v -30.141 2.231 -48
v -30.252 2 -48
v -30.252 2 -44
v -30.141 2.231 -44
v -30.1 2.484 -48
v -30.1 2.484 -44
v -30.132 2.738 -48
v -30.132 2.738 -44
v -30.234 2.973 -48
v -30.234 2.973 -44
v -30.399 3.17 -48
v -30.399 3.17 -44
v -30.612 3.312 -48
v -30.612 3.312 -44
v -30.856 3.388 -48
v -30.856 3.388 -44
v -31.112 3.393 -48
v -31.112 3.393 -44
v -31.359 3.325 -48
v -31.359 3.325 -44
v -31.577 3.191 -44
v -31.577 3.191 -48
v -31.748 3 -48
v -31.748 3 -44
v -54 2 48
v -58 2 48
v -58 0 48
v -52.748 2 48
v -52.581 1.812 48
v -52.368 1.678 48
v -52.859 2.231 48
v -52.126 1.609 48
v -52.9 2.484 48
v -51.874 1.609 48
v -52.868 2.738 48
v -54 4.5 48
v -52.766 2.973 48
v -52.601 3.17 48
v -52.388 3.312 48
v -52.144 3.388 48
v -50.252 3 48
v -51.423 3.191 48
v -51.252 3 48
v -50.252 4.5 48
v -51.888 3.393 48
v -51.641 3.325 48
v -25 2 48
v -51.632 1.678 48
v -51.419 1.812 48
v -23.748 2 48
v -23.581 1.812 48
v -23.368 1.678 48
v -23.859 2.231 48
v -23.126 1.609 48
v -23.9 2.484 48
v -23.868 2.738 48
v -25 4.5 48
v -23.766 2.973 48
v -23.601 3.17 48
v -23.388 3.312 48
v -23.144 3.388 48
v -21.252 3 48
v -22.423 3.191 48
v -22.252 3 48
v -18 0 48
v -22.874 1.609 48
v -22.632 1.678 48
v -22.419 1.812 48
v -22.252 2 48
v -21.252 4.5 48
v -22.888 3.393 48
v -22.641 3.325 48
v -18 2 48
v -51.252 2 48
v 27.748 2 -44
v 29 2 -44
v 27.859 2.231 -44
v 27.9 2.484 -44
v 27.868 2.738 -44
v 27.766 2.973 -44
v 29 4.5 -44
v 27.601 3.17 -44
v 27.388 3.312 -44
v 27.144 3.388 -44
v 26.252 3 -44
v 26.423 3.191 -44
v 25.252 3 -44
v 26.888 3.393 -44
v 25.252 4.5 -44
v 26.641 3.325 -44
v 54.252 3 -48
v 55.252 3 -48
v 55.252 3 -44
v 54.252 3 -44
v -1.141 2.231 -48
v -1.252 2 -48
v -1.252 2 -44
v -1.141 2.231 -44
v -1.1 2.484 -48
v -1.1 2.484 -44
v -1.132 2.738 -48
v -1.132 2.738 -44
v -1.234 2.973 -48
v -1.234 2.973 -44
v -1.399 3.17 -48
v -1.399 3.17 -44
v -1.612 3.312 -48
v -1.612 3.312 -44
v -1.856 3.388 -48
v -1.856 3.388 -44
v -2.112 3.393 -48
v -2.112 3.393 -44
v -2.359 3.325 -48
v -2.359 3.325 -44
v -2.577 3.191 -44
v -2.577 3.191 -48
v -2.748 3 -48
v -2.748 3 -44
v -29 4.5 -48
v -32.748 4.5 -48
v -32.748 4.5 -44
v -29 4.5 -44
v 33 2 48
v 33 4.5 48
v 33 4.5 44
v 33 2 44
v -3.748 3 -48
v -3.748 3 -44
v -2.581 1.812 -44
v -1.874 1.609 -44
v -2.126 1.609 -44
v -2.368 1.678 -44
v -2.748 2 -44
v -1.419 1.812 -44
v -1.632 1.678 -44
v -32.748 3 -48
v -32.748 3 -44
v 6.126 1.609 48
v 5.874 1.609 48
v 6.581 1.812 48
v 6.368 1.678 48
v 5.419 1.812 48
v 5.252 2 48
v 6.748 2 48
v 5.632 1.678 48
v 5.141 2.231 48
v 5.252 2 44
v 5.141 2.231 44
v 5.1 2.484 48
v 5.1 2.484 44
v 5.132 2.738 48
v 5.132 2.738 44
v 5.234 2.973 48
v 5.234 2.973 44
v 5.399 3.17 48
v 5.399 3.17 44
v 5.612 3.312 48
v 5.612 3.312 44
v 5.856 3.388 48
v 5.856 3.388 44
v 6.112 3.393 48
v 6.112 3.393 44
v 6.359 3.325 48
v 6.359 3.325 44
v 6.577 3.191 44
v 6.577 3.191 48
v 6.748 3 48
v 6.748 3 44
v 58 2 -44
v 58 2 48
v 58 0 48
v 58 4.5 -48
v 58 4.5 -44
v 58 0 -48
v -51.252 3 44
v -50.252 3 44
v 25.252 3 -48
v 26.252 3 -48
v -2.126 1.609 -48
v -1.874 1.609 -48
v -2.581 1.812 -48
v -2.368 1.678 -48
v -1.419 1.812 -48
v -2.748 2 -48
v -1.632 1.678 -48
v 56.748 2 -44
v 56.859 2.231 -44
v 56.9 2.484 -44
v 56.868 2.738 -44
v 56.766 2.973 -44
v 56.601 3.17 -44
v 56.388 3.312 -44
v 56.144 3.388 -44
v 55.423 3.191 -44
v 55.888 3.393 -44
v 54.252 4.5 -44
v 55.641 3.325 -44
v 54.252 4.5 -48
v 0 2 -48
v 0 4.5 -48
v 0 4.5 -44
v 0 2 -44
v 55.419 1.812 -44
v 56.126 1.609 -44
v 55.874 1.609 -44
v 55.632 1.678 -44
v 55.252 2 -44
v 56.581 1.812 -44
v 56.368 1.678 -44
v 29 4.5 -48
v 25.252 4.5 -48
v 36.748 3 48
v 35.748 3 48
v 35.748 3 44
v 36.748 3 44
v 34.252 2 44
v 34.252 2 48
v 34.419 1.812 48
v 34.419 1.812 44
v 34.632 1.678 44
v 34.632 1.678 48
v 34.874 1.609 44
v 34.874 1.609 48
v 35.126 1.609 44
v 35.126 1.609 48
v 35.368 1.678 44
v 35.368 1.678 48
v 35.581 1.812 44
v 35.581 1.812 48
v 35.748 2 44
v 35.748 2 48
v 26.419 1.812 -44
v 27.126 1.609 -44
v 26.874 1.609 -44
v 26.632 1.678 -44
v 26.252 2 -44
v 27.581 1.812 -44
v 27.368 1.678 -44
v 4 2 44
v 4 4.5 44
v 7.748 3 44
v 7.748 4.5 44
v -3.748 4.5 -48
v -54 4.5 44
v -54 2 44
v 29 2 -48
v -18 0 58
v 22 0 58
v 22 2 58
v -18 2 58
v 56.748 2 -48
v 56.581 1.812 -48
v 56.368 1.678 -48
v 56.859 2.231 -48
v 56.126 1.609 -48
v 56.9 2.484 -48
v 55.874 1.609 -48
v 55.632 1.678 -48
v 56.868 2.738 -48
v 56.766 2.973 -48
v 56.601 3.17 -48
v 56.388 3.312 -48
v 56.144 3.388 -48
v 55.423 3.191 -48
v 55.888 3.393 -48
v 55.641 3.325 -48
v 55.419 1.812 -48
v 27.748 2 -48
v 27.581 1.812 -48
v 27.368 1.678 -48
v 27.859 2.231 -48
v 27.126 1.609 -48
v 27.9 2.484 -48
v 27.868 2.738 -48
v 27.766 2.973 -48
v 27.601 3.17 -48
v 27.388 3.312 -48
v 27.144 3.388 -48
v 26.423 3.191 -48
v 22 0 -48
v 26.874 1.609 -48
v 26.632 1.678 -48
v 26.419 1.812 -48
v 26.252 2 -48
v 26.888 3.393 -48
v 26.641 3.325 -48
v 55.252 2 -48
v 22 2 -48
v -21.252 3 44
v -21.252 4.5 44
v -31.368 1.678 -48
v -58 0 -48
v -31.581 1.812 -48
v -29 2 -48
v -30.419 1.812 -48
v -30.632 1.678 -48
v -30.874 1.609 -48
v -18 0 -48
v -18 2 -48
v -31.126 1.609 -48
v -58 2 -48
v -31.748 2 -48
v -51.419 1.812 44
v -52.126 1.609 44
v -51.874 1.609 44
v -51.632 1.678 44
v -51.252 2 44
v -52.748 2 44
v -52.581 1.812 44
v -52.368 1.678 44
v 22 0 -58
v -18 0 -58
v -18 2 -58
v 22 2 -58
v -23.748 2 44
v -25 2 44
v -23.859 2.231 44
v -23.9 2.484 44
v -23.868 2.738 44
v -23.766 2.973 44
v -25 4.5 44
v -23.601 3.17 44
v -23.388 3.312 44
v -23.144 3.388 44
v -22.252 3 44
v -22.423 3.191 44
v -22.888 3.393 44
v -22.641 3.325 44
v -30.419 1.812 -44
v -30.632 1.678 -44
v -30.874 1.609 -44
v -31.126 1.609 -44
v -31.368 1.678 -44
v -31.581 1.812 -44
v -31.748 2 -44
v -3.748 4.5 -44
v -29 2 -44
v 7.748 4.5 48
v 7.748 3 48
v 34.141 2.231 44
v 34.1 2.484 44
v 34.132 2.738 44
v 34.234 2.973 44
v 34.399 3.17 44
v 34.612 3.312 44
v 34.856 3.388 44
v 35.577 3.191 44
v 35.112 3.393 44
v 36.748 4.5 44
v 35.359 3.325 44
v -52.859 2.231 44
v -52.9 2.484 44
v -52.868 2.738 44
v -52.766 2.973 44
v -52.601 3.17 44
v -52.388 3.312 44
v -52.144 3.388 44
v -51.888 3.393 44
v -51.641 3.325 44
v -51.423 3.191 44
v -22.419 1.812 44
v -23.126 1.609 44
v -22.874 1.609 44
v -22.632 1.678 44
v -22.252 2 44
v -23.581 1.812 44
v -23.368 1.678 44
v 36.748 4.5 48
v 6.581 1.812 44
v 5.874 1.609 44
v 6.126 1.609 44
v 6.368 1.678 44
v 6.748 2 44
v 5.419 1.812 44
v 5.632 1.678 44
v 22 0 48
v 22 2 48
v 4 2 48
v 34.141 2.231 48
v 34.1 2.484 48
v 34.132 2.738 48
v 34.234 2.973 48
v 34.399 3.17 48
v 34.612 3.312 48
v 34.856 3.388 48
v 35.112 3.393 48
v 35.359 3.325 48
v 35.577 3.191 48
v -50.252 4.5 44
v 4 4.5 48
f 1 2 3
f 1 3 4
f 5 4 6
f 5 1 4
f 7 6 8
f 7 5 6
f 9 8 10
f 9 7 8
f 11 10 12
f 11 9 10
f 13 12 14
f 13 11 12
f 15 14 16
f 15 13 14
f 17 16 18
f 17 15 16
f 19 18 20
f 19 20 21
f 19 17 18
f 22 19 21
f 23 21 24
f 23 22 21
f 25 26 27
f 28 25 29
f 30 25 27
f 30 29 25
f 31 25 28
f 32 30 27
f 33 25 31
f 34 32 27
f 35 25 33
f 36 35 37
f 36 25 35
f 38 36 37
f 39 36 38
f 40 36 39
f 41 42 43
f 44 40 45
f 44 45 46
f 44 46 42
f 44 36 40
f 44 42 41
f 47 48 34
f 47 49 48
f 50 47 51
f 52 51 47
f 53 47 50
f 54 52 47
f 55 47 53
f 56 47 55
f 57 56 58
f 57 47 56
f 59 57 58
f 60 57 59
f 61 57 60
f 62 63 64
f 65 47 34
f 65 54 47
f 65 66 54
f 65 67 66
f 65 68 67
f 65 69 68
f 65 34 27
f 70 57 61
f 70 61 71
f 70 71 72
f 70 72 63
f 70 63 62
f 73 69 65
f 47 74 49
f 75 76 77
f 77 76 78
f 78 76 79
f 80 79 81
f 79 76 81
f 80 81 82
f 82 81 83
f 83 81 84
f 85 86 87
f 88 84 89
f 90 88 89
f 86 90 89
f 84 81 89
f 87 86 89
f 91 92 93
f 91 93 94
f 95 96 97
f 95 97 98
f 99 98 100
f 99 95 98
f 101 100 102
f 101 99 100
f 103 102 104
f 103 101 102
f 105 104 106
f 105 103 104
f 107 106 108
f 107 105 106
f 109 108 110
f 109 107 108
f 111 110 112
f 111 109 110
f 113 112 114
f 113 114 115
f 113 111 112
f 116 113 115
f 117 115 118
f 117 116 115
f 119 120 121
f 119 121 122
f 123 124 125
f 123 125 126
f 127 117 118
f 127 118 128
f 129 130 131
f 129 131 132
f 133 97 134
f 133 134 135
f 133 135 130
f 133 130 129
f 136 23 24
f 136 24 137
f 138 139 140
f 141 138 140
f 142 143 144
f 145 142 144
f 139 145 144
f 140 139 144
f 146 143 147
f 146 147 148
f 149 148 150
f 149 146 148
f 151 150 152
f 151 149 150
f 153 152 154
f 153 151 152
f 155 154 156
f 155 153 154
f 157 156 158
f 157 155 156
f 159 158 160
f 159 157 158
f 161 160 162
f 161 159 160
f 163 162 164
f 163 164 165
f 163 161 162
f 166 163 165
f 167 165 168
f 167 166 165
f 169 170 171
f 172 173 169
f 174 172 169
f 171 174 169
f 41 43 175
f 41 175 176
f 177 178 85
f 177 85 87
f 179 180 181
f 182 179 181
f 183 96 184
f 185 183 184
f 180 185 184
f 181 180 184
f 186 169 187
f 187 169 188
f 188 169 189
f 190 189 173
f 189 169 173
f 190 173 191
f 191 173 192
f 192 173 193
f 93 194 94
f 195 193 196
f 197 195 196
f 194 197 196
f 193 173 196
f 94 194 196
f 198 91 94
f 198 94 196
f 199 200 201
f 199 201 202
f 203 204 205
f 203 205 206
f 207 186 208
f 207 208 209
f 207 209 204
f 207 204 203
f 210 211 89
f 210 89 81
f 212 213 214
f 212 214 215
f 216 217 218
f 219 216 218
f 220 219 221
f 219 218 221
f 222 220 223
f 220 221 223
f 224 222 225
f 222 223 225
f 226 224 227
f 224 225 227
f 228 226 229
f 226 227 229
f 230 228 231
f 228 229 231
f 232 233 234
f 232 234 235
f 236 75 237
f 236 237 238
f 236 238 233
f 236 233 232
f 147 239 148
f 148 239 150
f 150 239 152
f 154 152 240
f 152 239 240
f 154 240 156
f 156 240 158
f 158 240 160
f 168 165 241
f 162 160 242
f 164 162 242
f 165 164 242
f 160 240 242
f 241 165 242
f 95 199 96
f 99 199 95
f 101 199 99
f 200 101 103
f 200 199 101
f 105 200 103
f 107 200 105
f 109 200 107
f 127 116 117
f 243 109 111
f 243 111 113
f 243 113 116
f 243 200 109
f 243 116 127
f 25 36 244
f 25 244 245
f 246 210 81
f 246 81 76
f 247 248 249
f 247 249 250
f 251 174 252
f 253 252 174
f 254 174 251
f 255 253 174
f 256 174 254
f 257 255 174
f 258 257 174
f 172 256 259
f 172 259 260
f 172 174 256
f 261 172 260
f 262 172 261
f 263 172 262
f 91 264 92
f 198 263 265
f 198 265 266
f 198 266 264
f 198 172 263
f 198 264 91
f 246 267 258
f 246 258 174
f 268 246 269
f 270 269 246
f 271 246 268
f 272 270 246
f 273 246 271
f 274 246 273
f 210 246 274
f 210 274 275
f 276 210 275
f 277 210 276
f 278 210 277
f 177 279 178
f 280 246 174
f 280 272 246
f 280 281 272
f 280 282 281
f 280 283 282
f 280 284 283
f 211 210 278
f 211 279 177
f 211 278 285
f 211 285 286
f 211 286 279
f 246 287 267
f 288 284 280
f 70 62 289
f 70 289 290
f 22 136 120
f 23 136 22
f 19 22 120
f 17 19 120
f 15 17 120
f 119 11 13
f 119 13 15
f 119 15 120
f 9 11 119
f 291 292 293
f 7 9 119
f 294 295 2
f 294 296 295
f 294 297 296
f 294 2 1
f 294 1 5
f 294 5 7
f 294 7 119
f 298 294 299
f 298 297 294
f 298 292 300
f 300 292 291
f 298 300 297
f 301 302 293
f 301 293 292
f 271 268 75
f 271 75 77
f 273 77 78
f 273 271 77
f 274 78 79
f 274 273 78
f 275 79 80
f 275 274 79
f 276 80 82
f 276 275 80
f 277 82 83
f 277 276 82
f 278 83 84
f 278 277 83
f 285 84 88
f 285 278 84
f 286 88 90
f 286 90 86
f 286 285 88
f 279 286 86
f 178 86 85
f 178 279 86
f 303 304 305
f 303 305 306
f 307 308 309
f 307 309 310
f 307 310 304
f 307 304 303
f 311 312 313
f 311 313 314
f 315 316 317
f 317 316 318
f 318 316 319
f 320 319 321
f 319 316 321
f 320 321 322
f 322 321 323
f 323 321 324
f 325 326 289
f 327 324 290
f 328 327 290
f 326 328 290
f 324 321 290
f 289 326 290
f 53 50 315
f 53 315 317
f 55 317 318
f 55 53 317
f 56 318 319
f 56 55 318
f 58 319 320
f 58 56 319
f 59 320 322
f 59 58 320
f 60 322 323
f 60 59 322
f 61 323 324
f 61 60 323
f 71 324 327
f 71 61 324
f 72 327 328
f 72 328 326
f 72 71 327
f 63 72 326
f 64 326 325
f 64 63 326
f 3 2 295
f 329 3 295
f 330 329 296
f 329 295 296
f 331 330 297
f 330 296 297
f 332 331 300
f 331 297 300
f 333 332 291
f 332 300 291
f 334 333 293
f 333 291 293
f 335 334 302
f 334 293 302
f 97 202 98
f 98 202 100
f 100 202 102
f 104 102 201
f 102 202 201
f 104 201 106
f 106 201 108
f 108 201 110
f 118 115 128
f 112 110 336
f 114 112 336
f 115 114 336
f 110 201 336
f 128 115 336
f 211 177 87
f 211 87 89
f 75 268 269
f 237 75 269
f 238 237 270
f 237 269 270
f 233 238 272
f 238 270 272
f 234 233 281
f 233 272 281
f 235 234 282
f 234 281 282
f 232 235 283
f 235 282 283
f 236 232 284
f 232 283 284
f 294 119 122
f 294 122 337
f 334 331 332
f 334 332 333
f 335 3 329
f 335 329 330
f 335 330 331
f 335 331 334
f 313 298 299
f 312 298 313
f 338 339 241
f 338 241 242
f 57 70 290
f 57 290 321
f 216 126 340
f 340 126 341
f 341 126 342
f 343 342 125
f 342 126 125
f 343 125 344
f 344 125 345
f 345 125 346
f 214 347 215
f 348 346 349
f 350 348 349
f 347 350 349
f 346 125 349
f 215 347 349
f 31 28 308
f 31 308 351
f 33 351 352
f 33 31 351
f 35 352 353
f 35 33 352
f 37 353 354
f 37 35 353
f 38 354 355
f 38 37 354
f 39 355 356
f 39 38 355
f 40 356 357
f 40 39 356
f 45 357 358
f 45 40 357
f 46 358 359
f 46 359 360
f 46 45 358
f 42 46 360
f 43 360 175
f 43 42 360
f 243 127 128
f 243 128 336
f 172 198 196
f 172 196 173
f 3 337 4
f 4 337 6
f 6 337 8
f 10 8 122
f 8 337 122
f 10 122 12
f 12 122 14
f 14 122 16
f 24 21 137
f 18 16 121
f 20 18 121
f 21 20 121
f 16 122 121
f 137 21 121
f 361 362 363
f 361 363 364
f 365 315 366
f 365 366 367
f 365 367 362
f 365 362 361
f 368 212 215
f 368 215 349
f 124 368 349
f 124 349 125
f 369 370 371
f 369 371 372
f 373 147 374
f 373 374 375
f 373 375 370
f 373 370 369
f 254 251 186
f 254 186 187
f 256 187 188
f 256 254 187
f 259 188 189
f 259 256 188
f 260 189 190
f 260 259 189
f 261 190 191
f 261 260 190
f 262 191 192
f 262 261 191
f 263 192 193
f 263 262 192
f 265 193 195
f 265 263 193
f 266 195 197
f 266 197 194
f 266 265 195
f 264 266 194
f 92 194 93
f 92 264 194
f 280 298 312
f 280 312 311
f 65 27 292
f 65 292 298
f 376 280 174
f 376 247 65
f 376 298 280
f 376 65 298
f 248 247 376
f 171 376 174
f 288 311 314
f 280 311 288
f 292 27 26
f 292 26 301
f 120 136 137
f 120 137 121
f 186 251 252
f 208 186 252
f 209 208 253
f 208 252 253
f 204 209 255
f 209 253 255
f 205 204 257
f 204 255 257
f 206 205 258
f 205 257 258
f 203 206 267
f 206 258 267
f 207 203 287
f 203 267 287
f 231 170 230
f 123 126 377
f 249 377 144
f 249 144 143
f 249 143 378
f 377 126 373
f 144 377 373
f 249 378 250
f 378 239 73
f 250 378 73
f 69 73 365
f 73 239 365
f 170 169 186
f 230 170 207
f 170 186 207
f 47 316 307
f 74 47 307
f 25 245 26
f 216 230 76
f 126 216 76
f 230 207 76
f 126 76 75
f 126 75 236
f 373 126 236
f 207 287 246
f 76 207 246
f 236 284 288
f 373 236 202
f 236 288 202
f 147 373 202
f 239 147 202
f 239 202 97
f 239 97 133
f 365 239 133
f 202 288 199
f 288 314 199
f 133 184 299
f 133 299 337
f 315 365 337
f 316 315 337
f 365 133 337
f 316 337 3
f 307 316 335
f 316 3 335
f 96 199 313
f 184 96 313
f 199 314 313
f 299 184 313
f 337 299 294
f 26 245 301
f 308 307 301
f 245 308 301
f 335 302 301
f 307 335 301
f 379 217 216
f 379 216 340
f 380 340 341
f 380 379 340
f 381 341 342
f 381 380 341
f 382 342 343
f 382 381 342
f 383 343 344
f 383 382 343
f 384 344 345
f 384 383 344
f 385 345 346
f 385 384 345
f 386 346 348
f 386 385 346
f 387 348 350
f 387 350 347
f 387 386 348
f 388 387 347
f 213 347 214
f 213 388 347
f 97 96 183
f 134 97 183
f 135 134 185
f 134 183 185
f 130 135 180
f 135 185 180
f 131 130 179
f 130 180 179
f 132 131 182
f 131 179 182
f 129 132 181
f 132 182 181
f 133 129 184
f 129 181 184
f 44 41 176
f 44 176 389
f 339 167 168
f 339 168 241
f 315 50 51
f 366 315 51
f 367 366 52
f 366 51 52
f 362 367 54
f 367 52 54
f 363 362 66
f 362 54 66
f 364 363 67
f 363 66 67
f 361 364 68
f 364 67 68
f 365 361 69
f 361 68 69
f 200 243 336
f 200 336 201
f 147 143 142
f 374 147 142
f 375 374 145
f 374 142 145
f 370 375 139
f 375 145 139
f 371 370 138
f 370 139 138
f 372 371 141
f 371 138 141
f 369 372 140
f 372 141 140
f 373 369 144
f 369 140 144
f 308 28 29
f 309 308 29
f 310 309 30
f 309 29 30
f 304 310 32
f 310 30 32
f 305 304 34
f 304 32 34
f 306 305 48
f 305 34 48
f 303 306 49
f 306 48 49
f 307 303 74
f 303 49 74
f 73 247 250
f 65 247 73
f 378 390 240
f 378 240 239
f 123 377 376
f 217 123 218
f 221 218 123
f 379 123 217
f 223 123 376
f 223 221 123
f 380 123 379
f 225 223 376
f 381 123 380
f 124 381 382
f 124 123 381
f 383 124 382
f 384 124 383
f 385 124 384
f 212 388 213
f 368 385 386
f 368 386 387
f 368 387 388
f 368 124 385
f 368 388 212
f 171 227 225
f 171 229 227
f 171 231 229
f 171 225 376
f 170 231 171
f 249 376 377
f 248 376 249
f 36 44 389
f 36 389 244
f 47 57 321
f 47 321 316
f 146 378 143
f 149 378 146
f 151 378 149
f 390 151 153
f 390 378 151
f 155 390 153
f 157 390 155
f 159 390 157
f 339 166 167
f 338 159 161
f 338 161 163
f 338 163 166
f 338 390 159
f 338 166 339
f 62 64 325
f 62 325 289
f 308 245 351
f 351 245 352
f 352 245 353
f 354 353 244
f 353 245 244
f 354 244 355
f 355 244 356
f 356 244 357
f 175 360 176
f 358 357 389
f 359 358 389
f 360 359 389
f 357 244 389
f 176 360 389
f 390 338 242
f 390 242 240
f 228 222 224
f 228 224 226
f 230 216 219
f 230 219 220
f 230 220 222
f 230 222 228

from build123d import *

# Parameters (mm, degrees)
BOSS_EXTRUDE1_DEPTH    = 2
BOSS_EXTRUDE2_DEPTH    = 4
CUT_EXTRUDE1_DEPTH     = 4
CIRPATTERN1_COUNT      = 2
LPATTERN4_COUNT        = 4
LPATTERN4_PITCH        = 29
LPATTERN4_COPY_1_DEPTH = 4
LPATTERN4_COPY_2_DEPTH = 4
LPATTERN4_COPY_3_DEPTH = 4
LPATTERN4_COPY_4_DEPTH = 4
LPATTERN4_COPY_5_DEPTH = 4
LPATTERN4_COPY_6_DEPTH = 4


with BuildPart() as part:
    # Sketch1 → Boss-Extrude1 (new body)
    with BuildSketch(Plane(origin=(0, 0, 0), x_dir=(1, 0, 0), z_dir=(0, 1, 0))):
        Polygon((-18, -58), (-18, -48), (-58, -48), (-58, 48), (-18, 48), (-18, 58), (22, 58), (22, 48), (58, 48), (58, -48), (22, -48), (22, -58), align=None)
    extrude(amount=BOSS_EXTRUDE1_DEPTH)

    # Sketch2 → Boss-Extrude2 (add)
    with BuildSketch(Plane(origin=(0, 0, -48), x_dir=(-1, 0, 0), z_dir=(0, 0, -1))):
        with BuildLine():
            ThreePointArc((-55.251668523, 2), (-56.9, 2.5), (-55.251668523, 3))
            Line((-55.251668523, 3), (-54.251668523, 3))
            Line((-54.251668523, 3), (-54.251668523, 4.5))
            Line((-54.251668523, 4.5), (-58, 4.5))
            Line((-58, 4.5), (-58, 0))
            Line((-58, 0), (-54.251668523, 0))
            Line((-54.251668523, 0), (-54.251668523, 2))
            Line((-54.251668523, 2), (-55.251668523, 2))
        make_face()
    boss_extrude2 = extrude(amount=-BOSS_EXTRUDE2_DEPTH)

    # Sketch2<3> → Cut-Extrude1 (cut)
    with BuildSketch(Plane(origin=(0, 0, -48), x_dir=(-1, 0, 0), z_dir=(0, 0, -1))):
        with BuildLine():
            Line((-55.251668523, 2), (-56.748331477, 2))
            ThreePointArc((-56.748331477, 2), (-56, 1.6), (-55.251668523, 2))
        make_face()
    cut_extrude1 = extrude(amount=-CUT_EXTRUDE1_DEPTH, mode=Mode.SUBTRACT)

    # CirPattern1: Boss-Extrude2, Cut-Extrude1 ×2 about axis
    cirpattern1_axis = Axis((45.5, 2, 0), (0, 1, 0))
    add([boss_extrude2.rotate(cirpattern1_axis, i * 360 / CIRPATTERN1_COUNT) for i in range(1, CIRPATTERN1_COUNT)])
    add([cut_extrude1.rotate(cirpattern1_axis, i * 360 / CIRPATTERN1_COUNT) for i in range(1, CIRPATTERN1_COUNT)], mode=Mode.SUBTRACT)

    # LPattern4: Boss-Extrude2, Cut-Extrude1 ×4
    with Locations(*[(-i * LPATTERN4_PITCH, 0, 0) for i in range(1, LPATTERN4_COUNT)]):
        add(boss_extrude2)
        add(cut_extrude1, mode=Mode.SUBTRACT)

    # LPattern4 copy 1 sketch → LPattern4 copy 1 (add)
    with BuildSketch(Plane(origin=(62, 0, 48), x_dir=(1, 0, 0), z_dir=(0, 0, 1))):
        with BuildLine():
            ThreePointArc((-55.251668523, 2), (-56.9, 2.5), (-55.251668523, 3))
            Line((-55.251668523, 3), (-54.251668523, 3))
            Line((-54.251668523, 3), (-54.251668523, 4.5))
            Line((-54.251668523, 4.5), (-58, 4.5))
            Line((-58, 4.5), (-58, 0))
            Line((-58, 0), (-54.251668523, 0))
            Line((-54.251668523, 0), (-54.251668523, 2))
            Line((-54.251668523, 2), (-55.251668523, 2))
        make_face()
    extrude(amount=-LPATTERN4_COPY_1_DEPTH)

    # LPattern4 copy 2 sketch → LPattern4 copy 2 (add)
    with BuildSketch(Plane(origin=(33, 0, 48), x_dir=(1, 0, 0), z_dir=(0, 0, 1))):
        with BuildLine():
            ThreePointArc((-55.251668523, 2), (-56.9, 2.5), (-55.251668523, 3))
            Line((-55.251668523, 3), (-54.251668523, 3))
            Line((-54.251668523, 3), (-54.251668523, 4.5))
            Line((-54.251668523, 4.5), (-58, 4.5))
            Line((-58, 4.5), (-58, 0))
            Line((-58, 0), (-54.251668523, 0))
            Line((-54.251668523, 0), (-54.251668523, 2))
            Line((-54.251668523, 2), (-55.251668523, 2))
        make_face()
    extrude(amount=-LPATTERN4_COPY_2_DEPTH)

    # LPattern4 copy 3 sketch → LPattern4 copy 3 (add)
    with BuildSketch(Plane(origin=(4, 0, 48), x_dir=(1, 0, 0), z_dir=(0, 0, 1))):
        with BuildLine():
            ThreePointArc((-55.251668523, 2), (-56.9, 2.5), (-55.251668523, 3))
            Line((-55.251668523, 3), (-54.251668523, 3))
            Line((-54.251668523, 3), (-54.251668523, 4.5))
            Line((-54.251668523, 4.5), (-58, 4.5))
            Line((-58, 4.5), (-58, 0))
            Line((-58, 0), (-54.251668523, 0))
            Line((-54.251668523, 0), (-54.251668523, 2))
            Line((-54.251668523, 2), (-55.251668523, 2))
        make_face()
    extrude(amount=-LPATTERN4_COPY_3_DEPTH)

    # LPattern4 copy 4 sketch → LPattern4 copy 4 (cut)
    with BuildSketch(Plane(origin=(62, 0, 48), x_dir=(1, 0, 0), z_dir=(0, 0, 1))):
        with BuildLine():
            Line((-55.251668523, 2), (-56.748331477, 2))
            ThreePointArc((-56.748331477, 2), (-56, 1.6), (-55.251668523, 2))
        make_face()
    extrude(amount=-LPATTERN4_COPY_4_DEPTH, mode=Mode.SUBTRACT)

    # LPattern4 copy 5 sketch → LPattern4 copy 5 (cut)
    with BuildSketch(Plane(origin=(33, 0, 48), x_dir=(1, 0, 0), z_dir=(0, 0, 1))):
        with BuildLine():
            Line((-55.251668523, 2), (-56.748331477, 2))
            ThreePointArc((-56.748331477, 2), (-56, 1.6), (-55.251668523, 2))
        make_face()
    extrude(amount=-LPATTERN4_COPY_5_DEPTH, mode=Mode.SUBTRACT)

    # LPattern4 copy 6 sketch → LPattern4 copy 6 (cut)
    with BuildSketch(Plane(origin=(4, 0, 48), x_dir=(1, 0, 0), z_dir=(0, 0, 1))):
        with BuildLine():
            Line((-55.251668523, 2), (-56.748331477, 2))
            ThreePointArc((-56.748331477, 2), (-56, 1.6), (-55.251668523, 2))
        make_face()
    extrude(amount=-LPATTERN4_COPY_6_DEPTH, mode=Mode.SUBTRACT)


solid = part.part
